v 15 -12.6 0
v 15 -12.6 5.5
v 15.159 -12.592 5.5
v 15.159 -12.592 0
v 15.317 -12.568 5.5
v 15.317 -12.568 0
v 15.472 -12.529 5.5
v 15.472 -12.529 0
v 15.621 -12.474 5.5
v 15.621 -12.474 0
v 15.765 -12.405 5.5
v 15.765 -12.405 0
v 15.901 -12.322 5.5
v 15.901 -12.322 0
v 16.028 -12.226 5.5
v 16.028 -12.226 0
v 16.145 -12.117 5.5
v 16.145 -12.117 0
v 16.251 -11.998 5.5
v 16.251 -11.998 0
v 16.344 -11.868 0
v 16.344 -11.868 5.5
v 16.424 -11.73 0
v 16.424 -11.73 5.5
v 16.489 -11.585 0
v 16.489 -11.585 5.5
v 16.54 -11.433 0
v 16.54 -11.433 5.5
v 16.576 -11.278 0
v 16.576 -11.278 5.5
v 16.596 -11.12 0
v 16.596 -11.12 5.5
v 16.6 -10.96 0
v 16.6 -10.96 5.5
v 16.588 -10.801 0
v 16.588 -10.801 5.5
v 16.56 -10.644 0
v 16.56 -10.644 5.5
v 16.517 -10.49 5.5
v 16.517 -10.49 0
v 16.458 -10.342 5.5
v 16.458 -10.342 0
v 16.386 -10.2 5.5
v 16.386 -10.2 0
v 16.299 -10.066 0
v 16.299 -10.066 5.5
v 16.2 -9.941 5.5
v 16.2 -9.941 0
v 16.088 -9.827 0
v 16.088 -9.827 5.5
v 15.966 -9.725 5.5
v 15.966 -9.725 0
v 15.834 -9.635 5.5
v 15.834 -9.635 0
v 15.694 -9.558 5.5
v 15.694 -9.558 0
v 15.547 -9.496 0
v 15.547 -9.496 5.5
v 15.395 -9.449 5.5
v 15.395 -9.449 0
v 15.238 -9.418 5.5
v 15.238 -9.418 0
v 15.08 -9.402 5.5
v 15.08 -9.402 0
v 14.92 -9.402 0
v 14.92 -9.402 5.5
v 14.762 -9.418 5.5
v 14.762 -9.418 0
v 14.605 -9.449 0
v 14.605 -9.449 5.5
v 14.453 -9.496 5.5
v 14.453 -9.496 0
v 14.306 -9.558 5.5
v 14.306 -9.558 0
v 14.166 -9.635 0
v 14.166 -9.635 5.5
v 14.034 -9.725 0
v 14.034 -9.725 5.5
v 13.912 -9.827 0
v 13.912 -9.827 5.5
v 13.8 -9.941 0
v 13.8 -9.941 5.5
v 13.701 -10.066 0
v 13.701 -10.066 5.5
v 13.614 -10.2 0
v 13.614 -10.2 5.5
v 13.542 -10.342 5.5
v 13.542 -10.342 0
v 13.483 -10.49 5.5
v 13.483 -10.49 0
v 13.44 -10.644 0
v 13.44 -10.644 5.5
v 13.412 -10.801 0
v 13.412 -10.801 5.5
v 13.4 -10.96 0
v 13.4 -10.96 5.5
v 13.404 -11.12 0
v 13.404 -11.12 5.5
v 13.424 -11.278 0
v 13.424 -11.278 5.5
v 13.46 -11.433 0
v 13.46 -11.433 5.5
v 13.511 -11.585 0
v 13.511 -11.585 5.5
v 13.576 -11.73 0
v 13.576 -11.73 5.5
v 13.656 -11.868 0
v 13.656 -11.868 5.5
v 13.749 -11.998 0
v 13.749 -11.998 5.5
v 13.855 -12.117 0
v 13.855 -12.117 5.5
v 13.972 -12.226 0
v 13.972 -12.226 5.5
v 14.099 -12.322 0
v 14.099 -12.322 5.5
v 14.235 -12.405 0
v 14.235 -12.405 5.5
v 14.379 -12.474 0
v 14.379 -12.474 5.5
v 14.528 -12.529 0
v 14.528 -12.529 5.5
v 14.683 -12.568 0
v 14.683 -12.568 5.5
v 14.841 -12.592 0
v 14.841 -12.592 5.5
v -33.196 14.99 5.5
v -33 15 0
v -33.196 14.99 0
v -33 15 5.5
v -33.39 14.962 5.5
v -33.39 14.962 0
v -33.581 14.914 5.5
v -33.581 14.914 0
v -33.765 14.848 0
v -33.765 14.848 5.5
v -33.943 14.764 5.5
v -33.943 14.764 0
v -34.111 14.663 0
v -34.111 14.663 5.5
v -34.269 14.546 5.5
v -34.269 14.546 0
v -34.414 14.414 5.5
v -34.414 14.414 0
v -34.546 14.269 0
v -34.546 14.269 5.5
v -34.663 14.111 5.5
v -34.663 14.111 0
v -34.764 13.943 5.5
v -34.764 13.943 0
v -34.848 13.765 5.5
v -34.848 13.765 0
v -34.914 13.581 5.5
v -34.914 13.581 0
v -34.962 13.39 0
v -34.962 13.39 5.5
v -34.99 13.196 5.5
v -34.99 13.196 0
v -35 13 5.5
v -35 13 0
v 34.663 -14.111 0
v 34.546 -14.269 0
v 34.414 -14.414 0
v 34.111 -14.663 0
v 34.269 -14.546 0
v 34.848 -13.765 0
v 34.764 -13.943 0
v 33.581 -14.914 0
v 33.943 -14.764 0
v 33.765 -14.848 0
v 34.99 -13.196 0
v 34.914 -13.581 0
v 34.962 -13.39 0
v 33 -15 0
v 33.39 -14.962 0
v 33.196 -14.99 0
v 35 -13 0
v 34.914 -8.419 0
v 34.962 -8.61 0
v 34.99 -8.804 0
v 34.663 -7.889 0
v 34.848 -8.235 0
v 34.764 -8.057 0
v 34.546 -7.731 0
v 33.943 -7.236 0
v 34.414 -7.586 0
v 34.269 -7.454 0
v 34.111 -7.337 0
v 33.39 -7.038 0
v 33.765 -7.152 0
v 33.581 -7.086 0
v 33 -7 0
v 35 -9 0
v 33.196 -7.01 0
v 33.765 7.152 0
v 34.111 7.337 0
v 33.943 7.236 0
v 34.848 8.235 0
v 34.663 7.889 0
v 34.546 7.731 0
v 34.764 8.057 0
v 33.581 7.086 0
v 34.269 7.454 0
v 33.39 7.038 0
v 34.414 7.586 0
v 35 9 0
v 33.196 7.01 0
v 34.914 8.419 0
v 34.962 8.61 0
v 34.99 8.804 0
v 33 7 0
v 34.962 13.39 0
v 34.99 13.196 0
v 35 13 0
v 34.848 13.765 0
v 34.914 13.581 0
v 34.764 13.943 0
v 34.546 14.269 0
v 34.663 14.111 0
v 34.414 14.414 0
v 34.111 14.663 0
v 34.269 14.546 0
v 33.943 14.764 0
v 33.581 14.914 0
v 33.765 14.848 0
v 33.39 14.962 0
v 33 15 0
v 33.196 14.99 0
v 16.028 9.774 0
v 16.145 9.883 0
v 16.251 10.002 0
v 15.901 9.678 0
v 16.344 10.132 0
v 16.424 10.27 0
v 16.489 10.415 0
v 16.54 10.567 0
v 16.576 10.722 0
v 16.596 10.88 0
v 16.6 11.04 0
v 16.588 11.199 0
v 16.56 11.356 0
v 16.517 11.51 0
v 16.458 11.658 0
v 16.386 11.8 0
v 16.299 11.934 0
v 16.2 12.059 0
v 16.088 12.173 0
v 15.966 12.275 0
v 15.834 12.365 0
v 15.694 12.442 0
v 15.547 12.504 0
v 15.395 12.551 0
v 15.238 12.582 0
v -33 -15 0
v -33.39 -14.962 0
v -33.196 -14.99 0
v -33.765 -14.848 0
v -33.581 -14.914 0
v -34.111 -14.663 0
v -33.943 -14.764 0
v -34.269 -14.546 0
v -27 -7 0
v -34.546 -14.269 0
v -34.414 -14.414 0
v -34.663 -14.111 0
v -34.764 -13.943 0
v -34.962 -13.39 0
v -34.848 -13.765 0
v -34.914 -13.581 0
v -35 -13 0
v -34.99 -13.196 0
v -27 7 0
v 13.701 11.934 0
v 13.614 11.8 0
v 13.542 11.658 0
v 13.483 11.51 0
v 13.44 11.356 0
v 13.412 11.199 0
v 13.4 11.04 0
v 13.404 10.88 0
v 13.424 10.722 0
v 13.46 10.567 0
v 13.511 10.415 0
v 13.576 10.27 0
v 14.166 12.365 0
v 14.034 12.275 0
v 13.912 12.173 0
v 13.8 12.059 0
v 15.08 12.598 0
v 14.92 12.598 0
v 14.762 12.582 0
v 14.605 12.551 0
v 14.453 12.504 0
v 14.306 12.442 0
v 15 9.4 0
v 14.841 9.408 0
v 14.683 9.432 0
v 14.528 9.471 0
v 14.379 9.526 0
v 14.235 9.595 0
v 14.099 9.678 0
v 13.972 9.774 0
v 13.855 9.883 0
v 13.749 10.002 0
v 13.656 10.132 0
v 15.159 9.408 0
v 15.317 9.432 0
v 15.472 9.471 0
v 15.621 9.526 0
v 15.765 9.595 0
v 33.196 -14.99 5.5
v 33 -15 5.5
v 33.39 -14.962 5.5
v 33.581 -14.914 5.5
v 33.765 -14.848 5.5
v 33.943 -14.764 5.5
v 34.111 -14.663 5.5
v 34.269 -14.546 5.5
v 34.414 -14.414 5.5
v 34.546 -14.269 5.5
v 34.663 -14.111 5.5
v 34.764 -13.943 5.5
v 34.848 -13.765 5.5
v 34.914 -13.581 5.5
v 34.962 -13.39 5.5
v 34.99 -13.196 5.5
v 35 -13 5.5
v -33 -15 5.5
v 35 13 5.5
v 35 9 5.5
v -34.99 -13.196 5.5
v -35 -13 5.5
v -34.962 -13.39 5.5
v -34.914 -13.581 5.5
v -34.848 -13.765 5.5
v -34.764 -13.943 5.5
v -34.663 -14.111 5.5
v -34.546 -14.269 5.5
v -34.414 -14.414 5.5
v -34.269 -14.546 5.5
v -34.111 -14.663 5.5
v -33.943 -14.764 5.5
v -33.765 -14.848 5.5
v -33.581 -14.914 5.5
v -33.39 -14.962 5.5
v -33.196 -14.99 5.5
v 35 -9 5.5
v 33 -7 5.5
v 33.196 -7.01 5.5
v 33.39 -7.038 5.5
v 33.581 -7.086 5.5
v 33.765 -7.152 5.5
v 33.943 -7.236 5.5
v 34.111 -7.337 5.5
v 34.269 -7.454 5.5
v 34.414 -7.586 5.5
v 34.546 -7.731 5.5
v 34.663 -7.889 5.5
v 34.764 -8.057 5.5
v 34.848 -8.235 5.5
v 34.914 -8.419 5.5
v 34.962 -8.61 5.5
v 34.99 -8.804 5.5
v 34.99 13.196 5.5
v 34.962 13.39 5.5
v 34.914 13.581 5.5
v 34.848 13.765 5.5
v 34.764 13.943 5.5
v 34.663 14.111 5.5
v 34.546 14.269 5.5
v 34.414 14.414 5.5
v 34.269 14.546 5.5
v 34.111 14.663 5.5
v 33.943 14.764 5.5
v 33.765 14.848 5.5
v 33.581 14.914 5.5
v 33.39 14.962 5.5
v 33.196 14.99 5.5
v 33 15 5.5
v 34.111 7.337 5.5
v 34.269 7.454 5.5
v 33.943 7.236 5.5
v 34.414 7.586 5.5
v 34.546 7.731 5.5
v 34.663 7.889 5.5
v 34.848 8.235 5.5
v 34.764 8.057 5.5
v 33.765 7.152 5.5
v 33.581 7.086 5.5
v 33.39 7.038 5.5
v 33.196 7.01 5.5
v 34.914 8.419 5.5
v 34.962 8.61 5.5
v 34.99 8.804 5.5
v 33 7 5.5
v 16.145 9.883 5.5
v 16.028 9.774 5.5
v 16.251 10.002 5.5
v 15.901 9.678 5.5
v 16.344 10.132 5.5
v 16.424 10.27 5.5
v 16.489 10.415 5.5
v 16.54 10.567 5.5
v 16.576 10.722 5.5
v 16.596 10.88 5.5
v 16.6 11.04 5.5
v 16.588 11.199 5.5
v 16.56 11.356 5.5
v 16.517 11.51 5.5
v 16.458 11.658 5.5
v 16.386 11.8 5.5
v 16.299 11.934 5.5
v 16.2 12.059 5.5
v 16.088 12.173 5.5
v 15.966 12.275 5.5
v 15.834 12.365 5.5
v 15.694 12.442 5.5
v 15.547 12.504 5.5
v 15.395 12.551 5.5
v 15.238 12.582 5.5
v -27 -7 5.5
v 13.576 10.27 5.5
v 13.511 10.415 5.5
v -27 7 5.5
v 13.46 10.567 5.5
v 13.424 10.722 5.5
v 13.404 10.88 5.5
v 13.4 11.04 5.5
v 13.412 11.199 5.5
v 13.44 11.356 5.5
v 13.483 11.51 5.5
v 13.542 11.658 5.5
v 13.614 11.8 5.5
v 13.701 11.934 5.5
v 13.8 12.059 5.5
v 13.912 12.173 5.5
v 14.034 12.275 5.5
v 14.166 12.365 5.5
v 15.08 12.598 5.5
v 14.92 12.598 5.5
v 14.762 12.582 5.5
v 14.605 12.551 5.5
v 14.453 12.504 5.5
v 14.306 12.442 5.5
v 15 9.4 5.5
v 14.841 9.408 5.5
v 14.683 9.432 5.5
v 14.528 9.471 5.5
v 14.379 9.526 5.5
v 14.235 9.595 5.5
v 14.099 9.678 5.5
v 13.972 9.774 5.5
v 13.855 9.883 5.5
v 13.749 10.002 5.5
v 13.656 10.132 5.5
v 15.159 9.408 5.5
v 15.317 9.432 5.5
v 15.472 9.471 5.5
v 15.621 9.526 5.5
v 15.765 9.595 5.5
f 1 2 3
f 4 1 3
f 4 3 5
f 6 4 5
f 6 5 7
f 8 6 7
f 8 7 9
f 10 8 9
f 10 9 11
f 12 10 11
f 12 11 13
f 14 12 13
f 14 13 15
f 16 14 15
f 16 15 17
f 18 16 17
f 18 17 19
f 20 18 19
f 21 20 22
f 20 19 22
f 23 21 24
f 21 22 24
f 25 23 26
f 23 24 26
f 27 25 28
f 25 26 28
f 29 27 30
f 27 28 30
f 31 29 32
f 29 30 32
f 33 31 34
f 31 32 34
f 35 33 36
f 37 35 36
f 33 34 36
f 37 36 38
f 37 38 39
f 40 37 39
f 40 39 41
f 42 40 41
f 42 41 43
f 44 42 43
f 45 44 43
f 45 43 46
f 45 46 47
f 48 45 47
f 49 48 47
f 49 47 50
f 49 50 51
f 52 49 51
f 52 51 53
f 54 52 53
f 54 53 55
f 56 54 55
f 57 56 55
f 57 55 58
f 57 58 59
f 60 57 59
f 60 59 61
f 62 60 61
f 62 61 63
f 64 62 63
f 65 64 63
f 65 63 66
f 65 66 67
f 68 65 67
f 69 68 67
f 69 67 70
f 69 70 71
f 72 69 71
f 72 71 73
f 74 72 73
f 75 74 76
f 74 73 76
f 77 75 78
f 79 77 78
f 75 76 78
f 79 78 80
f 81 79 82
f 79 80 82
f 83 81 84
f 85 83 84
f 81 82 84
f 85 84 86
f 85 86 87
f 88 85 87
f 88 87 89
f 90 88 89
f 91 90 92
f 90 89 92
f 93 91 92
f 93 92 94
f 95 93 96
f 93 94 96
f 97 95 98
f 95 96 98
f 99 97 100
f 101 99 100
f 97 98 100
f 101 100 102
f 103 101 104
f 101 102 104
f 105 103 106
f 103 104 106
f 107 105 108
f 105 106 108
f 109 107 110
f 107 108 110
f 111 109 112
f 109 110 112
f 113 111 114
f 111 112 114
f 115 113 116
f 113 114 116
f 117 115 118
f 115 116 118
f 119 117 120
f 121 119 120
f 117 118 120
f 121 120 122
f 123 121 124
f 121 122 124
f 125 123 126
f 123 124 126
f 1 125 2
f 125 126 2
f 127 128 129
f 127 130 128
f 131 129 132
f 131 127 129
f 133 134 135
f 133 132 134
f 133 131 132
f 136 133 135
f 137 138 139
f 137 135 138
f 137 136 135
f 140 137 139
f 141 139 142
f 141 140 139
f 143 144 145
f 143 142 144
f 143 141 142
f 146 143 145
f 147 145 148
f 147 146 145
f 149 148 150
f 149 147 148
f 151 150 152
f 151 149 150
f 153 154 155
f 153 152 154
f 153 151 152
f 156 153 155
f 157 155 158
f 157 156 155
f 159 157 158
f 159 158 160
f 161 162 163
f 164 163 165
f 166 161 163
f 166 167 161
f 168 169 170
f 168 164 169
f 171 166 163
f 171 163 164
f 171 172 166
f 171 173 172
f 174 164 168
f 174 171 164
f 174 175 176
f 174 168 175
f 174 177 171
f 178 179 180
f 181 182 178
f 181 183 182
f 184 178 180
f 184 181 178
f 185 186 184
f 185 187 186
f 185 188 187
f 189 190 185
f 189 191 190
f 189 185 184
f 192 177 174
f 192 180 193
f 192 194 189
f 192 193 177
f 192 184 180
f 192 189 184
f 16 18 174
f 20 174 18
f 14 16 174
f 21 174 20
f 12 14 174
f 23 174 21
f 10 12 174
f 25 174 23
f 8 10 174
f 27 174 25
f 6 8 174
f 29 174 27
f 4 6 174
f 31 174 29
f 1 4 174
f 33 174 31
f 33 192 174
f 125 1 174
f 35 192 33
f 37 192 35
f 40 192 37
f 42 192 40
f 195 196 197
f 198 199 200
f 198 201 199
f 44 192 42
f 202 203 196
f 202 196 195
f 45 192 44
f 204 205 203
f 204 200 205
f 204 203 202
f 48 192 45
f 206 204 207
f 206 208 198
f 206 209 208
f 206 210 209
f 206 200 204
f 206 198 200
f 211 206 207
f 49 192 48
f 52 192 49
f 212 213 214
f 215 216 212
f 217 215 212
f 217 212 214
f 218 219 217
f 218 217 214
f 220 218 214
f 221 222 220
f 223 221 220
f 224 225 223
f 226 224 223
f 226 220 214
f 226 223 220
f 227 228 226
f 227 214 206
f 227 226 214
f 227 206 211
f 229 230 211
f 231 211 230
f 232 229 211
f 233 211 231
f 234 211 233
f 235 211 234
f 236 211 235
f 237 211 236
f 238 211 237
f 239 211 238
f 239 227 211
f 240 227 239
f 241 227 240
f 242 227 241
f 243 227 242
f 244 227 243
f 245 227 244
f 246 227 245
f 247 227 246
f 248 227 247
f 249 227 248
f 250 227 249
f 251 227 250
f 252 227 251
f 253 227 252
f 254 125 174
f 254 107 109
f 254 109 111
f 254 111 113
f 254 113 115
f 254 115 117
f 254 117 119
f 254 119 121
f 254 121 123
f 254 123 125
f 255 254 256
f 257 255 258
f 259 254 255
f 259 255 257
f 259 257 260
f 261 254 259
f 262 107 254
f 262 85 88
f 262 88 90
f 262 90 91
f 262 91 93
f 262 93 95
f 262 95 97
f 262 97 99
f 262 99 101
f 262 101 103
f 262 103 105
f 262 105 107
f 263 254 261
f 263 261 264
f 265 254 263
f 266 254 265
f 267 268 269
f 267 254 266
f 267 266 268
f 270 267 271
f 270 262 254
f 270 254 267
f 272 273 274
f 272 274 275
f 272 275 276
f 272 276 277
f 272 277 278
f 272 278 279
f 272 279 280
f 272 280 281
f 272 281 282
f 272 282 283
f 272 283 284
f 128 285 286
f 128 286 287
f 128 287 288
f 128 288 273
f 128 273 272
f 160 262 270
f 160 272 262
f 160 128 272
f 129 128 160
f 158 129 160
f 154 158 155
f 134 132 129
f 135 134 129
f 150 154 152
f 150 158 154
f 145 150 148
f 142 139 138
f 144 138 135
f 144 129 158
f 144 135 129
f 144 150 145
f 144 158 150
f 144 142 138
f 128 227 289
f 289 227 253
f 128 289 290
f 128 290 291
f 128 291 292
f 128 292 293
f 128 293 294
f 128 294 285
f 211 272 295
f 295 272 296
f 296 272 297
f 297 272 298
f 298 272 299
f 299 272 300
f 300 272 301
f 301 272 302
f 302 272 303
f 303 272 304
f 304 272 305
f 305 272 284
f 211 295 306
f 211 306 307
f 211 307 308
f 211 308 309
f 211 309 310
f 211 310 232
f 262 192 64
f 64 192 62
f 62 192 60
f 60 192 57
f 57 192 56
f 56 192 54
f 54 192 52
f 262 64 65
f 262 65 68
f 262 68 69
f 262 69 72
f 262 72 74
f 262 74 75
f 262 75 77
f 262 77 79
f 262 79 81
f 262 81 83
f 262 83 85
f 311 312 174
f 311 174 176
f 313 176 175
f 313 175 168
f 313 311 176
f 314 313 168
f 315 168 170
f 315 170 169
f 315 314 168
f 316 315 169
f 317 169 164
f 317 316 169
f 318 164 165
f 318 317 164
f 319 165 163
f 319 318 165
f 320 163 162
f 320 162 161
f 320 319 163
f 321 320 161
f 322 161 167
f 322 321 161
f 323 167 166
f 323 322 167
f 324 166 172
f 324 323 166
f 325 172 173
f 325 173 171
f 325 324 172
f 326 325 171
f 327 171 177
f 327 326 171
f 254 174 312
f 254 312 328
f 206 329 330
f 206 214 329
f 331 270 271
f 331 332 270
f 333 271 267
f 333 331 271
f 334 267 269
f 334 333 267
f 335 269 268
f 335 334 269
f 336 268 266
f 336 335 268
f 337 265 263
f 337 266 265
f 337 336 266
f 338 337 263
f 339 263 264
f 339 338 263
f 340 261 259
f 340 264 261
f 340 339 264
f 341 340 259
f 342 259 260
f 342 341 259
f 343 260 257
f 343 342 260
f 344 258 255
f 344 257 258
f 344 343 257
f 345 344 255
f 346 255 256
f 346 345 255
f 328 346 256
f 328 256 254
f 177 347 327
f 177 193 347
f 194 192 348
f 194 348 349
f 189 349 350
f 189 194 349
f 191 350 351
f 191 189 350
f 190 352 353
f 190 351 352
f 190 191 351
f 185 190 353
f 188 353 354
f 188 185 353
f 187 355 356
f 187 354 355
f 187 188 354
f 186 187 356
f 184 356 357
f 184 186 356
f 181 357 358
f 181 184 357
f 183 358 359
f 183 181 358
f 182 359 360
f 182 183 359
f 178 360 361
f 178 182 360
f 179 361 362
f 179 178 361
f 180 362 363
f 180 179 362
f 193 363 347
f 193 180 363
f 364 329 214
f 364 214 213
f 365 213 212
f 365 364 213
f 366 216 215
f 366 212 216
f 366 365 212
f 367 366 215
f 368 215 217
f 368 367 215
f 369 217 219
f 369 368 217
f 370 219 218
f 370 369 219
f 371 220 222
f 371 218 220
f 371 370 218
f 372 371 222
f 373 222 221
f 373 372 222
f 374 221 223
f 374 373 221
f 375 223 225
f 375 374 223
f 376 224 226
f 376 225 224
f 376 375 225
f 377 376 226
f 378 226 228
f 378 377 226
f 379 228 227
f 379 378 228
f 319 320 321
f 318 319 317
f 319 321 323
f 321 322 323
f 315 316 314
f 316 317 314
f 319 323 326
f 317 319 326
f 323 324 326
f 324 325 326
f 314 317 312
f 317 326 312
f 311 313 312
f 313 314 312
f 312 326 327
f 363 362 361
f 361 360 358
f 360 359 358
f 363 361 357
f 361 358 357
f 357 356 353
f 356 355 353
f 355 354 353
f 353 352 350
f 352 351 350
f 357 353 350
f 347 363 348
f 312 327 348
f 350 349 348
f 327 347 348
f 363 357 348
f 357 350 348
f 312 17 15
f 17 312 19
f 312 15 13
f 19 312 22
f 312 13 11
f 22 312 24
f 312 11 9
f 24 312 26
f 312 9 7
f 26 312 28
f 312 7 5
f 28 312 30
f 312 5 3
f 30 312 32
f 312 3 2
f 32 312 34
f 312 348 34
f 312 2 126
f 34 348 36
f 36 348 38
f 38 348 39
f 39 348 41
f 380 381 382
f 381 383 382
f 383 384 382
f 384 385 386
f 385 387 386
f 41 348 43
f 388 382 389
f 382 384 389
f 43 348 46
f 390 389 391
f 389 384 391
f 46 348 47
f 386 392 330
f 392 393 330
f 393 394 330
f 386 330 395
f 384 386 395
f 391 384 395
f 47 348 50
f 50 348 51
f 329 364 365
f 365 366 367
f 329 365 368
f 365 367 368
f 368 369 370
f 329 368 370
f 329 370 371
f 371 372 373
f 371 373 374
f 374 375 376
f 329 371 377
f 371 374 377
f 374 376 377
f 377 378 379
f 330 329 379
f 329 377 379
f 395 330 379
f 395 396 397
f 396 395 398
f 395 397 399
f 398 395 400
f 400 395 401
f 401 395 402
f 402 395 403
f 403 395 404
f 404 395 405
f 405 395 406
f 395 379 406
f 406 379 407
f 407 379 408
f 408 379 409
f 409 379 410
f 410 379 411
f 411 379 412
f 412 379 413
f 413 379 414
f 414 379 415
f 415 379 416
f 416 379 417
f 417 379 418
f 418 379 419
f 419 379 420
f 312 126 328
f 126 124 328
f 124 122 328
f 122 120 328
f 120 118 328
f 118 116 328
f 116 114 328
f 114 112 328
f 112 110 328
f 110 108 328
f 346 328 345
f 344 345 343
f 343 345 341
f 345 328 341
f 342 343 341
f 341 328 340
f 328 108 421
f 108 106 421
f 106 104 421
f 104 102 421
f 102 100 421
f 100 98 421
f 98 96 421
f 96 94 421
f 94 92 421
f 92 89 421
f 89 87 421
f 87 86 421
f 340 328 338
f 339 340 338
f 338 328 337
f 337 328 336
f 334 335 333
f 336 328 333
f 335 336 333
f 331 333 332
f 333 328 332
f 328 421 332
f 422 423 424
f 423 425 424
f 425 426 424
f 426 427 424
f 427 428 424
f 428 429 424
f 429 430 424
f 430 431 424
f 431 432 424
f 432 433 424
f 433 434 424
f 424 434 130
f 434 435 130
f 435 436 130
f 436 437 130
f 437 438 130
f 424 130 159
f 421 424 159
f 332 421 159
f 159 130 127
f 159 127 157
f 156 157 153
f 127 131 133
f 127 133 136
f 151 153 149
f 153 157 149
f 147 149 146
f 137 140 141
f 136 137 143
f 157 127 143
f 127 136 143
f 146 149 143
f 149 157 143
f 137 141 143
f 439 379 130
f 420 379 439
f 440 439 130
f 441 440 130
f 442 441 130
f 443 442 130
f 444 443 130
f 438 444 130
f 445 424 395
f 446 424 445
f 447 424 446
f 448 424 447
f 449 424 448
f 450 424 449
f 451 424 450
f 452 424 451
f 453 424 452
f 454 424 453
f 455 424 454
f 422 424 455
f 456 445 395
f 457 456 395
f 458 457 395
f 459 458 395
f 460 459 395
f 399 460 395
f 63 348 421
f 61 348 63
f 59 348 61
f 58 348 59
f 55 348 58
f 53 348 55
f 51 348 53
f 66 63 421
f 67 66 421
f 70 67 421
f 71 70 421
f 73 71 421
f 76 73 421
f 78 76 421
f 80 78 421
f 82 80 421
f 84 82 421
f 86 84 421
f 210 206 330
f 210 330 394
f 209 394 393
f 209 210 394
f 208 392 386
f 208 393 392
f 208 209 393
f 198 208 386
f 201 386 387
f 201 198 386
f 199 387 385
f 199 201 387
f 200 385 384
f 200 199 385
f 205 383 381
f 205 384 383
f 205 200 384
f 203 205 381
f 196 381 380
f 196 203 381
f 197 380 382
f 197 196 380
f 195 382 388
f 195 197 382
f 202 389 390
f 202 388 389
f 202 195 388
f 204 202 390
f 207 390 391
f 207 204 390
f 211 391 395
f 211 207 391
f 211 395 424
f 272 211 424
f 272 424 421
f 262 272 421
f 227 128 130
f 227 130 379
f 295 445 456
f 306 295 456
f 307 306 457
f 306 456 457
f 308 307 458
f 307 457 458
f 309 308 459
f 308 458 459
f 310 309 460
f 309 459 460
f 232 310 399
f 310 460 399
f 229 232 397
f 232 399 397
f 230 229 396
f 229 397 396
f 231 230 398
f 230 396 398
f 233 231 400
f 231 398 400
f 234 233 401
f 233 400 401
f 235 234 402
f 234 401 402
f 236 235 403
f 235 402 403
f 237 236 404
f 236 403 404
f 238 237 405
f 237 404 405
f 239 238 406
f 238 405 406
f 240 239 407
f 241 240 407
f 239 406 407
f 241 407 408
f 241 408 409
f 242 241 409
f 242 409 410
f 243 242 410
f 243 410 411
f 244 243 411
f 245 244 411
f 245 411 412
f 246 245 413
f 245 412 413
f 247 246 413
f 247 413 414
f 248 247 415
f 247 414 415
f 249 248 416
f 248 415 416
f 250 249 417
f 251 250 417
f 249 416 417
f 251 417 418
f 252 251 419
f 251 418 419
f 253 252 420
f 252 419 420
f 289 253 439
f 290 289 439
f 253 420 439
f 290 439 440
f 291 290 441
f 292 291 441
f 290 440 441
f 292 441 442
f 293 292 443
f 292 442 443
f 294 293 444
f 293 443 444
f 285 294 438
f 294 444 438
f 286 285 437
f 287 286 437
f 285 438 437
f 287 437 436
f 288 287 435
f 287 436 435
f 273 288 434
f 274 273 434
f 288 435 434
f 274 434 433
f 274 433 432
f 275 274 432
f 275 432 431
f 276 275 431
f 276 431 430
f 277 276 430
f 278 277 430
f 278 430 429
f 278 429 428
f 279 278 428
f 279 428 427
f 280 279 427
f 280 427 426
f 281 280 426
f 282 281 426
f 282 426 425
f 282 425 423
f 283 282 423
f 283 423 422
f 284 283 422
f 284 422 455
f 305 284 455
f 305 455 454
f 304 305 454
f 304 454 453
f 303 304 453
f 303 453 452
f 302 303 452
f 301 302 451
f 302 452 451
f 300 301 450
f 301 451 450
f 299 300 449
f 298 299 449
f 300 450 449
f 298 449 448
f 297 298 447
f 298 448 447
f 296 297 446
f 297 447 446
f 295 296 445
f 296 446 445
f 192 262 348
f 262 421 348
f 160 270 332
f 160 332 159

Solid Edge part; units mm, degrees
sketch "Sketch1" plane through (0, 0, 0) normal (0, 0, 1) x (1, 0, 0)
  line L0 (35, -15) -> (-35, -15)
  line L1 (-35, -15) -> (-35, 15)
  line L2 (-35, 15) -> (35, 15)
  line L3 (35, 15) -> (35, -15)
  dimension "D1" = 70
  dimension "D2" = 70
  dimension "D3" = 30
extrude "Protrusion1" add sketch "Sketch1" along normal blind 5.5
sketch "Sketch2" plane through (0, 0, 5.5) normal (0, 0, 1) x (1, 0, 0)
  line L0 (35, 7) -> (-27, 7)
  line L1 (-27, 7) -> (-27, -7)
  line L2 (-27, -7) -> (35, -7)
  line L3 (35, -7) -> (35, 7)
  dimension "D1" = 14
  dimension "D2" = 8
extrude "Cutout1" cut sketch "Sketch2" against normal through all
hole "Hole_1" at (15, 11, 5.5) direction (0, 0, -1) diameter 3.2 end up to next
hole "Hole1" at (15, -11, 5.5) direction (0, 0, -1) diameter 3.2 end up to next
fillet "Round_1" radius 2 6 edges at (-35, -15, 2.75) (35, -15, 2.75) (35, -7, 2.75) (35, 7, 2.75) (35, 15, 2.75) (-35, 15, 2.75)
properties material "木材, アッシュ"
